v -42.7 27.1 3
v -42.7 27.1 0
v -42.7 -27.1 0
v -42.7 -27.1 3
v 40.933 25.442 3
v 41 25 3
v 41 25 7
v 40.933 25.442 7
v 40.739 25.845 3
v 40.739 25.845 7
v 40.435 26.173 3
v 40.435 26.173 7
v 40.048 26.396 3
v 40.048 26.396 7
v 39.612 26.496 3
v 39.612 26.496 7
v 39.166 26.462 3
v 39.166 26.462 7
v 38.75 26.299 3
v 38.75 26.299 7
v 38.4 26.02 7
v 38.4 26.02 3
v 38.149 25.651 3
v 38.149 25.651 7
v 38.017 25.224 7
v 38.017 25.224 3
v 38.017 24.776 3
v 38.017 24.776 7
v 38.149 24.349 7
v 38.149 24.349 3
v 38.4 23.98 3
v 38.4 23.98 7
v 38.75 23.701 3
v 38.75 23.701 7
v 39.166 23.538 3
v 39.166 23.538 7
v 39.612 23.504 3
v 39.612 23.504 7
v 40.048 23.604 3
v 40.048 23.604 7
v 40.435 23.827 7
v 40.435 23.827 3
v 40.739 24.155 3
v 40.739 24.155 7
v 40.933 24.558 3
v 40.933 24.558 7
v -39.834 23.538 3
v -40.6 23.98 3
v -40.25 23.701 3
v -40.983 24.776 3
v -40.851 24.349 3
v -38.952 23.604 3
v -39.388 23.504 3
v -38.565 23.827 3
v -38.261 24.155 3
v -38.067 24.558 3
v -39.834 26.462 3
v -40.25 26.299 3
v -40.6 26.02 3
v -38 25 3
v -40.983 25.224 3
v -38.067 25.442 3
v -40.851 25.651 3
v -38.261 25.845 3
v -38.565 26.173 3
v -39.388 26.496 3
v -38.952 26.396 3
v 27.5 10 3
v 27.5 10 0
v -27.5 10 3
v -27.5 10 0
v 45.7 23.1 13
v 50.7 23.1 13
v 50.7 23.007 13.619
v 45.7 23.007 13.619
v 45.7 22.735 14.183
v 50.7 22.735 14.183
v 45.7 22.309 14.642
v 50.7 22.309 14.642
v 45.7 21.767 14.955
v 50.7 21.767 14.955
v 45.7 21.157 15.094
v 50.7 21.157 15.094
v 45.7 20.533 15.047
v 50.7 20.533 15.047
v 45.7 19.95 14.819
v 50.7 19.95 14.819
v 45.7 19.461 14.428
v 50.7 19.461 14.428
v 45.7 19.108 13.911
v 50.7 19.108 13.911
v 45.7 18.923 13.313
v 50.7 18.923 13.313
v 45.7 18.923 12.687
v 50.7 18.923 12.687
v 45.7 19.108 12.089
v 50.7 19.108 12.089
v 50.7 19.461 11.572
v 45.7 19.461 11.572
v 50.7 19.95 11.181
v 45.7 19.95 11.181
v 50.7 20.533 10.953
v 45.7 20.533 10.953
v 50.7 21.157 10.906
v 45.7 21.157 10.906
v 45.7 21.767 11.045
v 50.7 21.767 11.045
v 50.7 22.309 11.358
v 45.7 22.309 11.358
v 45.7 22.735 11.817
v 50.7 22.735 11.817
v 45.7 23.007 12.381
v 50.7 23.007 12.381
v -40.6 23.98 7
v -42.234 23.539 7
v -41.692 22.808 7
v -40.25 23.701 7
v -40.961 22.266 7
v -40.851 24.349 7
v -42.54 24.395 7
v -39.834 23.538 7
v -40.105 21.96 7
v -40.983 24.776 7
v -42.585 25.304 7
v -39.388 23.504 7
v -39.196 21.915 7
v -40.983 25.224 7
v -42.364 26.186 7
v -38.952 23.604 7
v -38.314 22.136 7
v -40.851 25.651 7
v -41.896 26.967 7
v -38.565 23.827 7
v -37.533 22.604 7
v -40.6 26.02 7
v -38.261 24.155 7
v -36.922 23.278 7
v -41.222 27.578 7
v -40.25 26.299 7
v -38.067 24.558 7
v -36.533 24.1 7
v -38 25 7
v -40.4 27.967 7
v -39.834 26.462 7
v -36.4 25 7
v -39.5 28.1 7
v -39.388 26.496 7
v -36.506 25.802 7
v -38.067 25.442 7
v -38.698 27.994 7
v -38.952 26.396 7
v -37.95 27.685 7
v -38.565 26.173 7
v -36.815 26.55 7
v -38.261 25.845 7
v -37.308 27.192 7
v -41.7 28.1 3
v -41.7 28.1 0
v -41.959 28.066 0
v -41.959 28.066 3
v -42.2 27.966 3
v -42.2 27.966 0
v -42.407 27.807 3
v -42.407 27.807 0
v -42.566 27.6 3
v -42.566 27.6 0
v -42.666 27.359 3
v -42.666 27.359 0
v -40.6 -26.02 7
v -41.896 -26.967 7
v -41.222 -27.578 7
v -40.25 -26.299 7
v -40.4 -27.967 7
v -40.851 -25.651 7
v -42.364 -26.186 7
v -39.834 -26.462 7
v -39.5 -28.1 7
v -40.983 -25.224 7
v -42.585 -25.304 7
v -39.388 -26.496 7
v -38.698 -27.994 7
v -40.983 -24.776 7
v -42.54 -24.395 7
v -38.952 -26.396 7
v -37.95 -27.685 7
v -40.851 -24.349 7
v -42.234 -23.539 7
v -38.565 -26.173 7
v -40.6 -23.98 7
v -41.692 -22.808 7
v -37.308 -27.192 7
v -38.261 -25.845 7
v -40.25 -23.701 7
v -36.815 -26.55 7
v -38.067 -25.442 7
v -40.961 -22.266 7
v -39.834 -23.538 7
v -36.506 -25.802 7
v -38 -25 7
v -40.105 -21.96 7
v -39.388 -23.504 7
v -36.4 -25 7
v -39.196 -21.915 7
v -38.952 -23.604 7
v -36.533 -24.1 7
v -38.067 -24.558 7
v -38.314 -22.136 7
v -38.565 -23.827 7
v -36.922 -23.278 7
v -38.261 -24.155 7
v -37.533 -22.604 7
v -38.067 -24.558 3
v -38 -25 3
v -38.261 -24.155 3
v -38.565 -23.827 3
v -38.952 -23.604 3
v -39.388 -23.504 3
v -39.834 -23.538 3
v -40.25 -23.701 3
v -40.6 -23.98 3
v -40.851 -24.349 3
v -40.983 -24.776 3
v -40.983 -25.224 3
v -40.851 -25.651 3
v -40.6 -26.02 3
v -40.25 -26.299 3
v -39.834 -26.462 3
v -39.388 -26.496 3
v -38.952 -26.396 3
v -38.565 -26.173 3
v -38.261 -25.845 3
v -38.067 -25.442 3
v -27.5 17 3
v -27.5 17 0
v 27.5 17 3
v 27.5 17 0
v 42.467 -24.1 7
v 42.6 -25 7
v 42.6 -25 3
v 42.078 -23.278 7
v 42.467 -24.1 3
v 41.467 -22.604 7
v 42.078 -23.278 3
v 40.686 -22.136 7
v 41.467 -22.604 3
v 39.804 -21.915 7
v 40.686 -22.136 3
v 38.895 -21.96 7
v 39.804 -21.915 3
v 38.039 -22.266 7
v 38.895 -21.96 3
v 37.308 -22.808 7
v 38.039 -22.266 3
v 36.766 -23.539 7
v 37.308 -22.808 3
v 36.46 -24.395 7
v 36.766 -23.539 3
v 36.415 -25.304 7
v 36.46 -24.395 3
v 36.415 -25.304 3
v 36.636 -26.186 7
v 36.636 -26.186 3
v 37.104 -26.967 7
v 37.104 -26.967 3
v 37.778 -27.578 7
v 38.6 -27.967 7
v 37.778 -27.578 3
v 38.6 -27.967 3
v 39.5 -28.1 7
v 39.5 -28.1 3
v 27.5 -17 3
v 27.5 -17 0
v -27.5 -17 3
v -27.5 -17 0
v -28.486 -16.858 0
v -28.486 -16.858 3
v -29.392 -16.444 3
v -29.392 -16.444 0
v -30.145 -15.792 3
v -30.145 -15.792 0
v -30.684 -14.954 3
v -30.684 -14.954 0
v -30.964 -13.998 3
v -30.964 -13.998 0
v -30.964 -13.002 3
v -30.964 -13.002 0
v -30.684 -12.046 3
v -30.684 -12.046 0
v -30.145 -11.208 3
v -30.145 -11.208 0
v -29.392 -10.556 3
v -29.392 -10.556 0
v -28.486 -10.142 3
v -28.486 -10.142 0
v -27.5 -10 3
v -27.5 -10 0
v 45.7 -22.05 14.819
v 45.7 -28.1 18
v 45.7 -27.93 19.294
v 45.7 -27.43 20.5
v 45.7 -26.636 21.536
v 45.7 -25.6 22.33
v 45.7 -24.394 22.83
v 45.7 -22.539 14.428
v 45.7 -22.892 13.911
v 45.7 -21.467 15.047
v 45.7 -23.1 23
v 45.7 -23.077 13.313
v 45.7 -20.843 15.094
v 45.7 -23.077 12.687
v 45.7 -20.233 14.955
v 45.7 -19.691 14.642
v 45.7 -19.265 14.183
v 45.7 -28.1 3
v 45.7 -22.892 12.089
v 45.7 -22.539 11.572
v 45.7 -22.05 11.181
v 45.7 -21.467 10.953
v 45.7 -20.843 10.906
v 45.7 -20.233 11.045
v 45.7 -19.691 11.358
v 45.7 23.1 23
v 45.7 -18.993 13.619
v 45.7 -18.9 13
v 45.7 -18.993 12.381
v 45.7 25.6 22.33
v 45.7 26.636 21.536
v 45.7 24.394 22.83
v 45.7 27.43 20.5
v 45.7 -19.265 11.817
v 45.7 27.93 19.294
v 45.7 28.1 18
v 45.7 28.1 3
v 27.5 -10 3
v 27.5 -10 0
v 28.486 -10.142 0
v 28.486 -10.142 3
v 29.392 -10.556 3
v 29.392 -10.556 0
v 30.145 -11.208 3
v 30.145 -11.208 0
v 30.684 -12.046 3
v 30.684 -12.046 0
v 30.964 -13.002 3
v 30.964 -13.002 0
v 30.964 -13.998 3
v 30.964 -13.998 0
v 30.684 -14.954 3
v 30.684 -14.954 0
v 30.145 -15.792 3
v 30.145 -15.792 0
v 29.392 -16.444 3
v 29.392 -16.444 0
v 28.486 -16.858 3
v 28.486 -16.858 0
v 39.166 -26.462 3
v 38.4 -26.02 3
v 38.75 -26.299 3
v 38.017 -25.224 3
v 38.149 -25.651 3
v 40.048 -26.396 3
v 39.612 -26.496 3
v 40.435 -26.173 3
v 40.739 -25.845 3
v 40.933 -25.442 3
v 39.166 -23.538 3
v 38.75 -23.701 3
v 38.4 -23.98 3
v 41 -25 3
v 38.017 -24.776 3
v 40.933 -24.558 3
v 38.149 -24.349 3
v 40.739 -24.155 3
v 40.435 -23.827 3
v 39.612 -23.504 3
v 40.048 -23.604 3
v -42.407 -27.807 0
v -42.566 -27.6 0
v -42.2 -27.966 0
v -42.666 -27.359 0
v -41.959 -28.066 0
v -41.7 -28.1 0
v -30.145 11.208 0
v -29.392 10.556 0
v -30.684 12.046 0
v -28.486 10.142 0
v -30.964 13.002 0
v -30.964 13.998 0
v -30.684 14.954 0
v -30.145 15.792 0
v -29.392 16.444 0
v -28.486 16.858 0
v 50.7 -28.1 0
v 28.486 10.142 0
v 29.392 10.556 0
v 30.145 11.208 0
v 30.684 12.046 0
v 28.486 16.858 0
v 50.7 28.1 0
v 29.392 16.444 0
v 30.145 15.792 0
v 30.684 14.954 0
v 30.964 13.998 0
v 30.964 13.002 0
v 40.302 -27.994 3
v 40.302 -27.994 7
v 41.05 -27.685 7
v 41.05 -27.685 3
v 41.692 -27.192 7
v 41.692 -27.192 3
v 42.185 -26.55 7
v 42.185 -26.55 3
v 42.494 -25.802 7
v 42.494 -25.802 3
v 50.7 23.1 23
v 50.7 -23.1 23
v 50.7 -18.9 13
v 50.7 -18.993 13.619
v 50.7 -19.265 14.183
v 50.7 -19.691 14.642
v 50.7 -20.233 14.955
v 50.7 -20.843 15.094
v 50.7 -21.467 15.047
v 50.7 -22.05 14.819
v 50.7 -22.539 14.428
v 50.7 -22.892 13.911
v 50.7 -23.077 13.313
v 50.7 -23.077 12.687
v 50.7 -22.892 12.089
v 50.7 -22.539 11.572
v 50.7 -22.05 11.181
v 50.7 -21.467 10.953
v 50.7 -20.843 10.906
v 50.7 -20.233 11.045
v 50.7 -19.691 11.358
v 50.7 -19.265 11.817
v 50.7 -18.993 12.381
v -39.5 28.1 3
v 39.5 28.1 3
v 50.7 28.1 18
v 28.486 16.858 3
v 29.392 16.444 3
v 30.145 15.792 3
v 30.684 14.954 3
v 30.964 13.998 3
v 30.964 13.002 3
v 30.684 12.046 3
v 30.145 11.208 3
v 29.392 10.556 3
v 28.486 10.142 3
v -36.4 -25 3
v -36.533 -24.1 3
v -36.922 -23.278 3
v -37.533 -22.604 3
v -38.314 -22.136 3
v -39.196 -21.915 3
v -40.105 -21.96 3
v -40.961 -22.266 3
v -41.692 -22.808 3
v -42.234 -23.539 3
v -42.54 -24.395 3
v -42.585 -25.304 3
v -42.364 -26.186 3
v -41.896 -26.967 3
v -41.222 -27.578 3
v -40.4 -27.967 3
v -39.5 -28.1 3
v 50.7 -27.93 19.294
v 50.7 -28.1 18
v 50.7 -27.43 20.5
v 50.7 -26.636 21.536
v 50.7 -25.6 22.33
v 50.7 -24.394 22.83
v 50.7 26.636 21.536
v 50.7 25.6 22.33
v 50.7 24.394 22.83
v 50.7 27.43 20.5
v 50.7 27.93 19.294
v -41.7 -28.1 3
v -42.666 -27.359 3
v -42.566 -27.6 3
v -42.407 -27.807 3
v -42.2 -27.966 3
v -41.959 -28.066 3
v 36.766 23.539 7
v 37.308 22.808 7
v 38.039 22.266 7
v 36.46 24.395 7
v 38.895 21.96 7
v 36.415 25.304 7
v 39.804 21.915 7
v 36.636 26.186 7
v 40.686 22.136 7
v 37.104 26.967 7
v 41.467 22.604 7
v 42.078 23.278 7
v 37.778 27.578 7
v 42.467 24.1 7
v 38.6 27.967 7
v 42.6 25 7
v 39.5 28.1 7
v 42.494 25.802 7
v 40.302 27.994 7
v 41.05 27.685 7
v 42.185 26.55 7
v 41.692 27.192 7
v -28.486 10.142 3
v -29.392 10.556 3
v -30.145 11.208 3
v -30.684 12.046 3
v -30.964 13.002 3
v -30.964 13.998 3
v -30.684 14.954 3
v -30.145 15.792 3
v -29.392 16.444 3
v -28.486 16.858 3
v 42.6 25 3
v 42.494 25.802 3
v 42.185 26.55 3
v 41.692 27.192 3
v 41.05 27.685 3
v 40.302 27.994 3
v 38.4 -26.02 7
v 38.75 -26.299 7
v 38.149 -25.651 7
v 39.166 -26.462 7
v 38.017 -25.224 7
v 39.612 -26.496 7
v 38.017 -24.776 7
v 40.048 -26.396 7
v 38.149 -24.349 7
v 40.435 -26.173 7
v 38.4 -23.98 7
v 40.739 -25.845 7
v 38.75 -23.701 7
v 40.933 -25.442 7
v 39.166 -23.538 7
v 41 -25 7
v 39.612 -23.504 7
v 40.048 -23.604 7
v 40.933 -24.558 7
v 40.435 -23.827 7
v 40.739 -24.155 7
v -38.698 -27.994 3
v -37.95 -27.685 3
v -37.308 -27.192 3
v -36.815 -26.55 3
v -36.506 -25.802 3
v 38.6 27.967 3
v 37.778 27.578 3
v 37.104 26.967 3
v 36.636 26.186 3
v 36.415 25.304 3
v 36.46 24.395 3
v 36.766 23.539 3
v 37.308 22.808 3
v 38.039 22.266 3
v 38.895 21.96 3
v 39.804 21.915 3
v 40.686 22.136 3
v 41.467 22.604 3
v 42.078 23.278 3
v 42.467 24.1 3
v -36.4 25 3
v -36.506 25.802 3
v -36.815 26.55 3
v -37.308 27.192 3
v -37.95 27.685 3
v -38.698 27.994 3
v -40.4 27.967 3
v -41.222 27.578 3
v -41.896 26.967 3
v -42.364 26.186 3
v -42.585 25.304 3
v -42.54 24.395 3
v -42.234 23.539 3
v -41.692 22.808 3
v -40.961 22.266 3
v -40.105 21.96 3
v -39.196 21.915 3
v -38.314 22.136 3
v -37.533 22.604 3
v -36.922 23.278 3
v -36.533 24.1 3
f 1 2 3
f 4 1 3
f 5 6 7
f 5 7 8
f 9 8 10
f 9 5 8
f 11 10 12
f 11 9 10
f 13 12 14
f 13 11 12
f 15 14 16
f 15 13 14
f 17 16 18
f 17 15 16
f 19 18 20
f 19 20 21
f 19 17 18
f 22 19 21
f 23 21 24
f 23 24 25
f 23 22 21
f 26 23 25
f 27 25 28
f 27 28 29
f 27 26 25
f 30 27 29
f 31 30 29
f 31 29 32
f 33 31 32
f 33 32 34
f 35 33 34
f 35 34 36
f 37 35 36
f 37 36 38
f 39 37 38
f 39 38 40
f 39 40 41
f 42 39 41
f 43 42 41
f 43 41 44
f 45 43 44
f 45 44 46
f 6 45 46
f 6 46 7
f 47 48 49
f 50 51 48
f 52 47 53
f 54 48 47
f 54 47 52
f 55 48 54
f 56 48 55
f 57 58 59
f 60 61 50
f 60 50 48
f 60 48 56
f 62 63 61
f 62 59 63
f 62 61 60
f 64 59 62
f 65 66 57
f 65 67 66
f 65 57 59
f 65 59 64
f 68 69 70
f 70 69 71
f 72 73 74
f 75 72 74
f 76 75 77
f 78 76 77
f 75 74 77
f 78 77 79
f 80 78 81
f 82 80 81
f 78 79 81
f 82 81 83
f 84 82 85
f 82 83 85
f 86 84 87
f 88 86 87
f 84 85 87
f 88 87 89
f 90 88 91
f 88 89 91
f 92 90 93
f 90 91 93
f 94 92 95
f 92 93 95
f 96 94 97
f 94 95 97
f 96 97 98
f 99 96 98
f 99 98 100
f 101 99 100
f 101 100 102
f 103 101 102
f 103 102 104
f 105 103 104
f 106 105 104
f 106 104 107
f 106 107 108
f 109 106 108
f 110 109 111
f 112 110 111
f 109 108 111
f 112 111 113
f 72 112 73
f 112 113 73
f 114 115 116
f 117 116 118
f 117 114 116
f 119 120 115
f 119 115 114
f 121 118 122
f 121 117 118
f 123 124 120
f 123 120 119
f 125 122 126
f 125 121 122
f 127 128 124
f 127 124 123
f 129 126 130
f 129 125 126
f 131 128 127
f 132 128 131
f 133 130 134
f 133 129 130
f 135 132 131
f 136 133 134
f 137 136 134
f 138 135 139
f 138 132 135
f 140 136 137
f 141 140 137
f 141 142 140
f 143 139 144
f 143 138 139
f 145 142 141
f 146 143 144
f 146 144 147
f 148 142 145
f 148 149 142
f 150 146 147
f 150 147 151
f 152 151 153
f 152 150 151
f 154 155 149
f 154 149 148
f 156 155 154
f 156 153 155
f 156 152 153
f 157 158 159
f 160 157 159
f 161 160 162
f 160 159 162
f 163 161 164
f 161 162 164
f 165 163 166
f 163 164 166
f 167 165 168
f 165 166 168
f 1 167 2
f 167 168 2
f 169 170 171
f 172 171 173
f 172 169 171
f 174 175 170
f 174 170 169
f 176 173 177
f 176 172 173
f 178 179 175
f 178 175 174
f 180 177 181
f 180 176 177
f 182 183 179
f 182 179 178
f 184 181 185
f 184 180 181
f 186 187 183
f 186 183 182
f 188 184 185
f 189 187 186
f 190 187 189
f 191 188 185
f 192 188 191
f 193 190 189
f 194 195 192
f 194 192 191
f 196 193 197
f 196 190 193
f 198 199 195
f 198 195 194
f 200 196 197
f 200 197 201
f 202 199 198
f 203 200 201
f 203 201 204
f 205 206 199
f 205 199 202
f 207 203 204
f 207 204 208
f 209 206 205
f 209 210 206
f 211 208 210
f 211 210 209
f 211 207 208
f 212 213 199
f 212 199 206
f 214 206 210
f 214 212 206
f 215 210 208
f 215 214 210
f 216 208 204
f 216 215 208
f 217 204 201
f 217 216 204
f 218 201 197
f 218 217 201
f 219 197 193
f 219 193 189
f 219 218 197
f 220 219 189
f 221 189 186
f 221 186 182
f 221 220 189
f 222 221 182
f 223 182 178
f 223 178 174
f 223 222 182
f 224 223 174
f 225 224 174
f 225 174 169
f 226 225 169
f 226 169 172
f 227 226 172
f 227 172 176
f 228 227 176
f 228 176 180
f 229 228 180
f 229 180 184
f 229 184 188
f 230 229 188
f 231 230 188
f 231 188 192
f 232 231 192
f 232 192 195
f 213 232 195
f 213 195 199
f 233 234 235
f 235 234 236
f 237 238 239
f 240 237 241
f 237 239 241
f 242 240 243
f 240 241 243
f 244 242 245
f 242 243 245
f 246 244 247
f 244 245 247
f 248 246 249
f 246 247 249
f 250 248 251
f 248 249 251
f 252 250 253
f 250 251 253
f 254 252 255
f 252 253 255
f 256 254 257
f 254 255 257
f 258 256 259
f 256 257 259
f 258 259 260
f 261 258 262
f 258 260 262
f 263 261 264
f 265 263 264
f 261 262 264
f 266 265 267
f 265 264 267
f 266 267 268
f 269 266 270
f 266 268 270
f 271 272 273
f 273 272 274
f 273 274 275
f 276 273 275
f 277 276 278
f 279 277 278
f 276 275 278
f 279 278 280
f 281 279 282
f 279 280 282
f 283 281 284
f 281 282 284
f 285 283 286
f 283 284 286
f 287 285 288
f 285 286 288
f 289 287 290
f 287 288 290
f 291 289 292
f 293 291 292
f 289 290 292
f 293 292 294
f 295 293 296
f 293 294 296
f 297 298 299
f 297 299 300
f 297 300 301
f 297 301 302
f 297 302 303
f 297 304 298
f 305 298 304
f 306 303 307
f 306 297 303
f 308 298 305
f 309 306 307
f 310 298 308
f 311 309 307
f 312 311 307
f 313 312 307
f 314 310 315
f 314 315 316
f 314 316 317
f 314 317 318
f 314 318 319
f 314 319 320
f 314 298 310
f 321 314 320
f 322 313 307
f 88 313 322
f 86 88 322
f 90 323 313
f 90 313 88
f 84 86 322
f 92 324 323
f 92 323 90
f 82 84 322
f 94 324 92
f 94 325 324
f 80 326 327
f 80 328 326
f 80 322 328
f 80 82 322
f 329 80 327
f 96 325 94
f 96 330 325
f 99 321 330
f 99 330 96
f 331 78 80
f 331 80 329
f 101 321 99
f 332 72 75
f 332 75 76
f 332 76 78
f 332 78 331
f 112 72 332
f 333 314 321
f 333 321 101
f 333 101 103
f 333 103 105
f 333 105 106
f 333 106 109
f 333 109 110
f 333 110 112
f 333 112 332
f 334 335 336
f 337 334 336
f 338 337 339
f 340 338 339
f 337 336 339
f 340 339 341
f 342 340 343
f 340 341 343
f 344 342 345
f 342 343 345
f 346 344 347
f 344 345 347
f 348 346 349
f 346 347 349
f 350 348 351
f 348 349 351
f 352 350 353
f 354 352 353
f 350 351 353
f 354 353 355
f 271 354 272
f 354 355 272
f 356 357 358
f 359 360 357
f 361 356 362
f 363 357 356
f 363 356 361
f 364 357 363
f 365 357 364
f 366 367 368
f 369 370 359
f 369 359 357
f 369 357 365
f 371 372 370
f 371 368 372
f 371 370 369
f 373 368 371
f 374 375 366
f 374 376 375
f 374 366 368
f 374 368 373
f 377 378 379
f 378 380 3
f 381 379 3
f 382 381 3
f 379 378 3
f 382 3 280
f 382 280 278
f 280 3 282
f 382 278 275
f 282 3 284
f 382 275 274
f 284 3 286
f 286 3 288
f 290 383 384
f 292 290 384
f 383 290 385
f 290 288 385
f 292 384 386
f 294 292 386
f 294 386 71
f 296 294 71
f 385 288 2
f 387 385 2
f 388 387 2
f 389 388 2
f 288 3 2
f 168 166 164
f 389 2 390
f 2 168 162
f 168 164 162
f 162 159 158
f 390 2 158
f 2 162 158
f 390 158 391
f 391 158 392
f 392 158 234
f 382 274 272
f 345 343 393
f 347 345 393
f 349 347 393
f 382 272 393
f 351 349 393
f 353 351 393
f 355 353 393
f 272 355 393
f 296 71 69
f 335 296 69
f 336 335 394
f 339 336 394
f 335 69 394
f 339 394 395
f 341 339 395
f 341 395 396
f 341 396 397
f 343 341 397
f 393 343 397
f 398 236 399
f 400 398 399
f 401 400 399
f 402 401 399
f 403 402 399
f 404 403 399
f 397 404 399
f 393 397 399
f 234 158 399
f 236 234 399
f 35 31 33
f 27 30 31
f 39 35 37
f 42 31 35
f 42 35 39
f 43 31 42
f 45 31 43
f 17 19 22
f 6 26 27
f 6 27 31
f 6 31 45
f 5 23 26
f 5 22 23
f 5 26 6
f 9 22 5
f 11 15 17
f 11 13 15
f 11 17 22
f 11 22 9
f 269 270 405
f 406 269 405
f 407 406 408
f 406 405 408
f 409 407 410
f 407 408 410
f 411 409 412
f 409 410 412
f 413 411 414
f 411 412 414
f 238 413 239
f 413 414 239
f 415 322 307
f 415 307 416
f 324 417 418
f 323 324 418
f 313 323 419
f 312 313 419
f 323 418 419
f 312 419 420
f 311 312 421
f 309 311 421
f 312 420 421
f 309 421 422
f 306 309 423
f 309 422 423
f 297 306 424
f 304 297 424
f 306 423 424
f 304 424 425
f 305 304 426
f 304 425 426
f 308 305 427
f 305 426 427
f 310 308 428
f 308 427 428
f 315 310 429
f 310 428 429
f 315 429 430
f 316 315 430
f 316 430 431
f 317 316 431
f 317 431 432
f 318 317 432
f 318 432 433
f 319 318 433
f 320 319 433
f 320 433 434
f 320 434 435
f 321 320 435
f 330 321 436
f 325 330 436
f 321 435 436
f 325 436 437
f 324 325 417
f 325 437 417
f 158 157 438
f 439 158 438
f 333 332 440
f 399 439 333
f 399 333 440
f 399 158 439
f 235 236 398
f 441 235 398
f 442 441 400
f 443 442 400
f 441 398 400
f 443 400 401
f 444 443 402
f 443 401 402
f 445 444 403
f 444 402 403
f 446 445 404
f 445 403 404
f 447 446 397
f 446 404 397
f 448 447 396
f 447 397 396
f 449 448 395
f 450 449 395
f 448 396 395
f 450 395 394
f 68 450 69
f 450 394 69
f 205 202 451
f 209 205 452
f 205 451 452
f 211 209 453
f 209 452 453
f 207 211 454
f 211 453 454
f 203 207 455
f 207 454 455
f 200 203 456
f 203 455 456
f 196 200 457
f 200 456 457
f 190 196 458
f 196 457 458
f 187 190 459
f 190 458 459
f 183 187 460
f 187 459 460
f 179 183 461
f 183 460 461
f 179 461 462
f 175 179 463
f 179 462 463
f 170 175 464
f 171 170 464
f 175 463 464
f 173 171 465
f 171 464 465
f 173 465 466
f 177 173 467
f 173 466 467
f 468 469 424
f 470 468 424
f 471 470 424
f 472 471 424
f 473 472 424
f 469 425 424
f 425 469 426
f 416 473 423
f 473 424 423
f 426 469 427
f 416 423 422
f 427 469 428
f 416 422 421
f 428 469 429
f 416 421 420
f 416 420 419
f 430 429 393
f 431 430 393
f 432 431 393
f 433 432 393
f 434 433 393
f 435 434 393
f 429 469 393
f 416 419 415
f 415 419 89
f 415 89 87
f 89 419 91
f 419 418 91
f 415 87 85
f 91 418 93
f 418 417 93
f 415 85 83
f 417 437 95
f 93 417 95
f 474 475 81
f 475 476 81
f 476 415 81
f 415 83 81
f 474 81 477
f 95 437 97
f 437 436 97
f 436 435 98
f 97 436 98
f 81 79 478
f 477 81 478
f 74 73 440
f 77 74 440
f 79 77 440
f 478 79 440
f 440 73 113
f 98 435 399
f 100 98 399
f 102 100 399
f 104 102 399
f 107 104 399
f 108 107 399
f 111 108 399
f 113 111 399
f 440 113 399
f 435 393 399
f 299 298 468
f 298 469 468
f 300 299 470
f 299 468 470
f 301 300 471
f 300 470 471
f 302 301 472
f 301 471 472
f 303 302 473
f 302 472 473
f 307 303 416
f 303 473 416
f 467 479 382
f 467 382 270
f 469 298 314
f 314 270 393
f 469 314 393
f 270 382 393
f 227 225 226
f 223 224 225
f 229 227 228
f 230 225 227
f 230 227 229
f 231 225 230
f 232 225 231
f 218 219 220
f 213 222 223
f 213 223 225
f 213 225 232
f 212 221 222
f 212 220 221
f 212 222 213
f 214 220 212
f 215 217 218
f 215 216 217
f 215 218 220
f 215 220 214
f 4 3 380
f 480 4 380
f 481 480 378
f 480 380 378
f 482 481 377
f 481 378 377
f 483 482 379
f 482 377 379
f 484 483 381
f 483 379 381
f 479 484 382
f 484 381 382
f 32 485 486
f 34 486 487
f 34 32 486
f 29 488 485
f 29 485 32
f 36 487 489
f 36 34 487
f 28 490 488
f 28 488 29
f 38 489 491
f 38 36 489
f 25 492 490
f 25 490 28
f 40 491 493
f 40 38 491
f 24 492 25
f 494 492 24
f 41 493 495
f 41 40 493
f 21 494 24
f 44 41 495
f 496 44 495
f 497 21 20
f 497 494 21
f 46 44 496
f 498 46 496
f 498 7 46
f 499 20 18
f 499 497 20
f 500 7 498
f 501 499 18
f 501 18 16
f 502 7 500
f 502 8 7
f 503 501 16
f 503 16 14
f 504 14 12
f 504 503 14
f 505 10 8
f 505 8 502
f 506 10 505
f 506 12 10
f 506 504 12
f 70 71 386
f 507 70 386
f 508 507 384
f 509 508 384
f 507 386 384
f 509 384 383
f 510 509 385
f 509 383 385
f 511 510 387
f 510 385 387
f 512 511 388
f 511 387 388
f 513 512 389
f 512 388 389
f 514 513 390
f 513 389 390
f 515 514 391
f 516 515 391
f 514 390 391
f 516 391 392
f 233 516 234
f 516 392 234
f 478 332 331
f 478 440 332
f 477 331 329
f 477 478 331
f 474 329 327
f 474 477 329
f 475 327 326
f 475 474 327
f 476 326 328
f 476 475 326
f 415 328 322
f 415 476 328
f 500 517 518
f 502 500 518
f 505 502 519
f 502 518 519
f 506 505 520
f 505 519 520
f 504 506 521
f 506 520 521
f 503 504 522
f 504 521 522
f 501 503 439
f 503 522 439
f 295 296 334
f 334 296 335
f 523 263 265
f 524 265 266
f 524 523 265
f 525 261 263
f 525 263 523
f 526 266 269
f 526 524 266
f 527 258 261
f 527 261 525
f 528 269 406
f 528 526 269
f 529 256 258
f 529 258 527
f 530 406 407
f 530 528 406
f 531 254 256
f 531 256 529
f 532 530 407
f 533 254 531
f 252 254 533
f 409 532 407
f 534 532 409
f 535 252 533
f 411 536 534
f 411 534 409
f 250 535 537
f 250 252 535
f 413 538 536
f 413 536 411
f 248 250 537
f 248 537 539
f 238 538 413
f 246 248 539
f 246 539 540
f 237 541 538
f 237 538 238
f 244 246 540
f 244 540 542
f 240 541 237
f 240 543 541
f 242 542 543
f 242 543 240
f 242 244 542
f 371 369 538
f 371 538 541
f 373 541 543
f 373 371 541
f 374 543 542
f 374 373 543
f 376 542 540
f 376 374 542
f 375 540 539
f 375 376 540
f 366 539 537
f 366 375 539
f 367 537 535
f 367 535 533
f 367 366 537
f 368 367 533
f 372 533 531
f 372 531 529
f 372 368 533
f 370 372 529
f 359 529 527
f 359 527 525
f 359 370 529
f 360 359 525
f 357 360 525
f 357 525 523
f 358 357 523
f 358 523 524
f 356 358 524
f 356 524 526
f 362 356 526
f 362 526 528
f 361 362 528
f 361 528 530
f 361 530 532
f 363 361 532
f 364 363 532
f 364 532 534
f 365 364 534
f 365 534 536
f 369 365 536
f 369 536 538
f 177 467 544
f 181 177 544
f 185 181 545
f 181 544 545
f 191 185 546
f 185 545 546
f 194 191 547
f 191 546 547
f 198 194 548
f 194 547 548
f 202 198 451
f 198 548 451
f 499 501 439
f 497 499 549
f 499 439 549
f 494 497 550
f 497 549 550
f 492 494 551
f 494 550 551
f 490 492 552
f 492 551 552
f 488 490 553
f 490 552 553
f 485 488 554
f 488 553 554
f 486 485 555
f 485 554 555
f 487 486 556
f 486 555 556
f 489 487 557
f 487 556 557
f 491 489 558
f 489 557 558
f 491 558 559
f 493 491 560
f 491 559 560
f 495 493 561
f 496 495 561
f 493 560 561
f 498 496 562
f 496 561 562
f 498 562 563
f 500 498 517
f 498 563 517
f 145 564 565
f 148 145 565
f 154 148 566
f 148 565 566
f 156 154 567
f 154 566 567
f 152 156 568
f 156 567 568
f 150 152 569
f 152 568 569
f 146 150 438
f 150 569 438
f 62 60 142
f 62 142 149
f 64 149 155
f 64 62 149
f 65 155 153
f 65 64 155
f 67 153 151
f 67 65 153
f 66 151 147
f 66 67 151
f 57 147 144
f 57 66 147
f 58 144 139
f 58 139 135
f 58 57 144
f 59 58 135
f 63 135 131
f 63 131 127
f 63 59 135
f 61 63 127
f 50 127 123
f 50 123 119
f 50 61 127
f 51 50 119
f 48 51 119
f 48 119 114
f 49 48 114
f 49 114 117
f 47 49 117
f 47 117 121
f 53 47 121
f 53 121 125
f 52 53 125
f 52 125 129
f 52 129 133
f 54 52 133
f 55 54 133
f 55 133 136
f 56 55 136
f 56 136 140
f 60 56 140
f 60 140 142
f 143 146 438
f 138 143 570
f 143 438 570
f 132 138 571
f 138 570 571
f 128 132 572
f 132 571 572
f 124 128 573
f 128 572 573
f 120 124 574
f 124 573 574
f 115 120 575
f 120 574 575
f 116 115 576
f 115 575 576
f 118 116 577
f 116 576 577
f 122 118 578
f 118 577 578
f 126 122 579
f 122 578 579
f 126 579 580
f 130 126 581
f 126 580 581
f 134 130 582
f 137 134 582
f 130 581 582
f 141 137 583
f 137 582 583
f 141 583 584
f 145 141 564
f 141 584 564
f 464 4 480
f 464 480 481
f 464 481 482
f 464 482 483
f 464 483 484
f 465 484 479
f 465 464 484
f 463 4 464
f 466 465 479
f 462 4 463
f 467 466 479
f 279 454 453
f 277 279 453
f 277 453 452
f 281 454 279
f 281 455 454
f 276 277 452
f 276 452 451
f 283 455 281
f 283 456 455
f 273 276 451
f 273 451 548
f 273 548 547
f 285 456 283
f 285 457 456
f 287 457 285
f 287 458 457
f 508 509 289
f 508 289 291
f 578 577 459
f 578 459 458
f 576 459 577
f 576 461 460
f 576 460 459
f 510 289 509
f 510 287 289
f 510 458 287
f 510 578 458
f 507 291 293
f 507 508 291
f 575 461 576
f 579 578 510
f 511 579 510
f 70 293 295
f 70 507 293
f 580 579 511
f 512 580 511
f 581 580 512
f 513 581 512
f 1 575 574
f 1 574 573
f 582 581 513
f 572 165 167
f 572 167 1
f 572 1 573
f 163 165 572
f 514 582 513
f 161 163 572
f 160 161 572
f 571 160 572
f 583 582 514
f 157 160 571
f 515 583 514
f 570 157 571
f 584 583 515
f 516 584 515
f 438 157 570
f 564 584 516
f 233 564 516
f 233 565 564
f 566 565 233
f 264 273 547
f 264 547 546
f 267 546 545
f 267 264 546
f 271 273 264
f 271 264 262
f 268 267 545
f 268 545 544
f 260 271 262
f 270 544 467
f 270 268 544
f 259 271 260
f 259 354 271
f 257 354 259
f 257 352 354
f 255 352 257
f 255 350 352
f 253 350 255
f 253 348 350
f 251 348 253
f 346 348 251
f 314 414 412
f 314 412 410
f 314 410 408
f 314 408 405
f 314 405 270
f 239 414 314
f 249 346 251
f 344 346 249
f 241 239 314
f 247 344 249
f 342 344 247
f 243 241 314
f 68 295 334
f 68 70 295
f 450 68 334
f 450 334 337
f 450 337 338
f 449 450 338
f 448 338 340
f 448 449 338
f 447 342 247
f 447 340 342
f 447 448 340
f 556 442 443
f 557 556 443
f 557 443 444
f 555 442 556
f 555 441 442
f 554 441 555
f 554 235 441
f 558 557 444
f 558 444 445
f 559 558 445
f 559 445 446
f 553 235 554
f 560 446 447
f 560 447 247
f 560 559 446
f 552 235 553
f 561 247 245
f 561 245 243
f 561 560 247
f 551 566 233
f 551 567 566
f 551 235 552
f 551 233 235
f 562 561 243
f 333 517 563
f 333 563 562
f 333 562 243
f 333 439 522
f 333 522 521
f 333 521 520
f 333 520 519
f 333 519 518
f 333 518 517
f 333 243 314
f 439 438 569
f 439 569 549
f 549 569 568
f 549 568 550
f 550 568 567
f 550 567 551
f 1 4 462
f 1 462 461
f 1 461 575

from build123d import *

# Parameters (mm, degrees)
F0_R     = 1.5
F1_DEPTH = 3
F2_DEPTH = 7
F0_W     = 5
F0_H     = 56.2
F3_DEPTH = 23
F4_R     = 2.1
F5_DEPTH = 5
F6_R     = 5


with BuildPart() as f1:
    # F0 (on Top) → F1 (new body)
    with BuildSketch(Plane.XY):
        with BuildLine():
            Line((-39.5, 28.1), (-41.7, 28.1))
            ThreePointArc((-41.7, 28.1), (-42.4071067812, 27.8071067812), (-42.7, 27.1))
            Line((-42.7, 27.1), (-42.7, -27.1))
            ThreePointArc((-42.7, -27.1), (-42.4071067812, -27.8071067812), (-41.7, -28.1))
            Line((-41.7, -28.1), (-39.5, -28.1))
            Line((-39.5, -28.1), (39.5, -28.1))
            Line((39.5, -28.1), (41.7, -28.1))
            ThreePointArc((41.7, -28.1), (42.4071067812, -27.8071067812), (42.7, -27.1))
            Line((42.7, -27.1), (42.7, 27.1))
            ThreePointArc((42.7, 27.1), (42.4071067812, 27.8071067812), (41.7, 28.1))
            Line((41.7, 28.1), (39.5, 28.1))
            Line((39.5, 28.1), (-39.5, 28.1))
        make_face()
        with BuildLine():
            ThreePointArc((-36.4, -25), (-37.3079689783, -27.1920310217), (-39.5, -28.1))
            ThreePointArc((-39.5, -28.1), (-41.6920310217, -22.8079689783), (-36.4, -25))
        make_face(mode=Mode.SUBTRACT)
        with BuildLine():
            Line((27.5, -17), (-27.5, -17))
            ThreePointArc((-27.5, -17), (-31, -13.5), (-27.5, -10))
            Line((-27.5, -10), (27.5, -10))
            ThreePointArc((27.5, -10), (31, -13.5), (27.5, -17))
        make_face(mode=Mode.SUBTRACT)
        with BuildLine():
            ThreePointArc((42.6, -25), (41.6920310217, -27.1920310217), (39.5, -28.1))
            ThreePointArc((39.5, -28.1), (37.3079689783, -22.8079689783), (42.6, -25))
        make_face(mode=Mode.SUBTRACT)
        with BuildLine():
            ThreePointArc((-27.5, 10), (-31, 13.5), (-27.5, 17))
            Line((-27.5, 17), (27.5, 17))
            ThreePointArc((27.5, 17), (31, 13.5), (27.5, 10))
            Line((27.5, 10), (-27.5, 10))
        make_face(mode=Mode.SUBTRACT)
        with BuildLine():
            ThreePointArc((-36.4, 25), (-41.6920310217, 22.8079689783), (-39.5, 28.1))
            ThreePointArc((-39.5, 28.1), (-37.3079689783, 27.1920310217), (-36.4, 25))
        make_face(mode=Mode.SUBTRACT)
        with BuildLine():
            ThreePointArc((42.6, 25), (37.3079689783, 22.8079689783), (39.5, 28.1))
            ThreePointArc((39.5, 28.1), (41.6920310217, 27.1920310217), (42.6, 25))
        make_face(mode=Mode.SUBTRACT)
        with BuildLine():
            Line((45.7, 28.1), (41.7, 28.1))
            ThreePointArc((41.7, 28.1), (42.4071067812, 27.8071067812), (42.7, 27.1))
            Line((42.7, 27.1), (42.7, -27.1))
            ThreePointArc((42.7, -27.1), (42.4071067812, -27.8071067812), (41.7, -28.1))
            Line((41.7, -28.1), (45.7, -28.1))
            Line((45.7, -28.1), (45.7, 28.1))
        make_face()
        with BuildLine():
            ThreePointArc((-36.4, 25), (-37.3079689783, 27.1920310217), (-39.5, 28.1))
            ThreePointArc((-39.5, 28.1), (-41.6920310217, 22.8079689783), (-36.4, 25))
        make_face()
        with Locations((-39.5, 25)):
            Circle(F0_R, mode=Mode.SUBTRACT)
        with BuildLine():
            ThreePointArc((-36.4, -25), (-41.6920310217, -22.8079689783), (-39.5, -28.1))
            ThreePointArc((-39.5, -28.1), (-37.3079689783, -27.1920310217), (-36.4, -25))
        make_face()
        with Locations((-39.5, -25)):
            Circle(F0_R, mode=Mode.SUBTRACT)
        with BuildLine():
            ThreePointArc((42.6, -25), (37.3079689783, -22.8079689783), (39.5, -28.1))
            ThreePointArc((39.5, -28.1), (41.6920310217, -27.1920310217), (42.6, -25))
        make_face()
        with Locations((39.5, -25)):
            Circle(F0_R, mode=Mode.SUBTRACT)
        with BuildLine():
            ThreePointArc((42.6, 25), (41.6920310217, 27.1920310217), (39.5, 28.1))
            ThreePointArc((39.5, 28.1), (37.3079689783, 22.8079689783), (42.6, 25))
        make_face()
        with Locations((39.5, 25)):
            Circle(F0_R, mode=Mode.SUBTRACT)
        with Locations((-39.5, 25)):
            Circle(F0_R)
        with Locations((-39.5, -25)):
            Circle(F0_R)
        with Locations((39.5, -25)):
            Circle(F0_R)
        with Locations((39.5, 25)):
            Circle(F0_R)
    extrude(amount=F1_DEPTH)

    # F0 (on Top) → F2 (join)
    with BuildSketch(Plane.XY):
        with BuildLine():
            ThreePointArc((-36.4, 25), (-37.3079689783, 27.1920310217), (-39.5, 28.1))
            ThreePointArc((-39.5, 28.1), (-41.6920310217, 22.8079689783), (-36.4, 25))
        make_face()
        with Locations((-39.5, 25)):
            Circle(F0_R, mode=Mode.SUBTRACT)
        with BuildLine():
            ThreePointArc((-36.4, -25), (-41.6920310217, -22.8079689783), (-39.5, -28.1))
            ThreePointArc((-39.5, -28.1), (-37.3079689783, -27.1920310217), (-36.4, -25))
        make_face()
        with Locations((-39.5, -25)):
            Circle(F0_R, mode=Mode.SUBTRACT)
        with BuildLine():
            ThreePointArc((42.6, -25), (37.3079689783, -22.8079689783), (39.5, -28.1))
            ThreePointArc((39.5, -28.1), (41.6920310217, -27.1920310217), (42.6, -25))
        make_face()
        with Locations((39.5, -25)):
            Circle(F0_R, mode=Mode.SUBTRACT)
        with BuildLine():
            ThreePointArc((42.6, 25), (41.6920310217, 27.1920310217), (39.5, 28.1))
            ThreePointArc((39.5, 28.1), (37.3079689783, 22.8079689783), (42.6, 25))
        make_face()
        with Locations((39.5, 25)):
            Circle(F0_R, mode=Mode.SUBTRACT)
    extrude(amount=F2_DEPTH)

    # F0 (on Top) → F3 (join)
    with BuildSketch(Plane.XY):
        with Locations((48.2, 0)):
            Rectangle(F0_W, F0_H)
    extrude(amount=F3_DEPTH)

    # F4 (on face) → F5 (cut, through all)
    with BuildSketch(Plane.YZ.offset(50.7)):
        with Locations((-21, 13)):
            Circle(F4_R)
        with Locations((21, 13)):
            Circle(F4_R)
    extrude(amount=-F5_DEPTH, mode=Mode.SUBTRACT)

    # F6
    f6_edges = [f1.edges().sort_by_distance(p)[0] for p in [
        (48.2, 28.1, 23),
        (48.2, -28.1, 23),
    ]]
    fillet(f6_edges, radius=F6_R)


solid = f1.part
